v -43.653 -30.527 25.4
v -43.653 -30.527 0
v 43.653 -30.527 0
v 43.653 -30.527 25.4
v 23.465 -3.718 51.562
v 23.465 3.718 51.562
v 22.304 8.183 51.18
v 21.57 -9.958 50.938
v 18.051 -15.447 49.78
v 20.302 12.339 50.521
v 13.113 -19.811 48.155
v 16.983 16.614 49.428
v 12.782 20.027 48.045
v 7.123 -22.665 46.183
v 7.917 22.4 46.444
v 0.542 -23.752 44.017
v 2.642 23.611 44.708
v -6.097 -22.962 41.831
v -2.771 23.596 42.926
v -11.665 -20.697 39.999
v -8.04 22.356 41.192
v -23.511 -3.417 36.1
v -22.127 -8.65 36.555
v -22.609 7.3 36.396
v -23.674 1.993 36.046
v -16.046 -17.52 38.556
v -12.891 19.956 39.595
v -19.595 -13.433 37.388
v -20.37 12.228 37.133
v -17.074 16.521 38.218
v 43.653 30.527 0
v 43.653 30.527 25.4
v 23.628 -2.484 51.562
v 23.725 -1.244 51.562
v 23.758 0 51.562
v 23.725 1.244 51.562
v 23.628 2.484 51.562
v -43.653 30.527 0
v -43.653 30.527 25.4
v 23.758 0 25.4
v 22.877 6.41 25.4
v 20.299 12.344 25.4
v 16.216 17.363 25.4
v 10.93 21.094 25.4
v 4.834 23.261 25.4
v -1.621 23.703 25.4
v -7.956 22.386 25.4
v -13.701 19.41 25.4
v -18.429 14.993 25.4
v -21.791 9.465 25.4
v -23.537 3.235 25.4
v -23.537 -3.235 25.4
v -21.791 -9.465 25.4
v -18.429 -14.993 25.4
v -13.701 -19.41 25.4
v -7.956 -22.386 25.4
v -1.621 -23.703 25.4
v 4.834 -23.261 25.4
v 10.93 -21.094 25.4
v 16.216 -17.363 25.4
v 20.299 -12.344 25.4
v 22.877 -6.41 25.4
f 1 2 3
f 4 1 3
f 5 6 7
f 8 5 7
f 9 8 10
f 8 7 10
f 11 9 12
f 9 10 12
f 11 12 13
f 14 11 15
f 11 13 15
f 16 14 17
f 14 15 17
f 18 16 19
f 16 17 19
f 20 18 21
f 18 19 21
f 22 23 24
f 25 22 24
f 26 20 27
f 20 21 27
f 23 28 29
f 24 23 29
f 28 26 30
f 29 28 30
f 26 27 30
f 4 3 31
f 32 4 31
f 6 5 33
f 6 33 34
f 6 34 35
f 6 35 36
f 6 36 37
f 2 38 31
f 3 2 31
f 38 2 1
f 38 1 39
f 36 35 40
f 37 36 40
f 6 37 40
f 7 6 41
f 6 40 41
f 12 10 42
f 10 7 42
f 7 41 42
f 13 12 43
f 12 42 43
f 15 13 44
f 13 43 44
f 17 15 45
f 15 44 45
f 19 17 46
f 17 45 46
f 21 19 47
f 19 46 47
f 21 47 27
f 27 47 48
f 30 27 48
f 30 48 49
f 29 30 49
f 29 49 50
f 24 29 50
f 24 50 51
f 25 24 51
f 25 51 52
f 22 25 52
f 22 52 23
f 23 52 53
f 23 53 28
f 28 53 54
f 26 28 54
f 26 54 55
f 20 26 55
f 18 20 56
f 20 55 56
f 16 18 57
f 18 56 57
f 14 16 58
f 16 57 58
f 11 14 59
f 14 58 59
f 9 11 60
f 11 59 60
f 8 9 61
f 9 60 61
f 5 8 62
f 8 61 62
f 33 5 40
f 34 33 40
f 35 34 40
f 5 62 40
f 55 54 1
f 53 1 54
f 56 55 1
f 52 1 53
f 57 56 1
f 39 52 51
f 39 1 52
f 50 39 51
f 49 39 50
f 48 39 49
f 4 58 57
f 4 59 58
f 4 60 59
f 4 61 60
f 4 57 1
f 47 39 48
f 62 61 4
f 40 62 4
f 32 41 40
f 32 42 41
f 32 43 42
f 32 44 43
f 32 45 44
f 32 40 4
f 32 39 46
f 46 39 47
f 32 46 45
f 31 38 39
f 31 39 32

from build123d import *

# Parameters (mm, degrees)
F0_W     = 87.306462
F0_H     = 61.053478
F0_R     = 23.75796
F1_DEPTH = 25.4
F2_R     = 23.75796
F3_DEPTH = 26.162
F5_DEPTH = 61.053477


with BuildPart() as f1:
    # F0 (on Top) → F1 (new body)
    with BuildSketch(Plane.XY):
        Rectangle(F0_W, F0_H)
        Circle(F0_R, mode=Mode.SUBTRACT)
        Circle(F0_R)
    extrude(amount=F1_DEPTH)

    # F2 (on face) → F3 (join)
    with BuildSketch(Plane.XY.offset(25.4)):
        Circle(F2_R)
    extrude(amount=F3_DEPTH)

    # F4 (on face) → F5 (cut, through all)
    with BuildSketch(Plane(origin=(0, 30.526739, 0), x_dir=(-1, 0, 0), z_dir=(0, 1, 0))):
        Polygon((24.116119, 52.158147), (-25.276357, 52.158147), (24.116119, 35.900317), align=None)
    extrude(amount=-F5_DEPTH, mode=Mode.SUBTRACT)


solid = f1.part
